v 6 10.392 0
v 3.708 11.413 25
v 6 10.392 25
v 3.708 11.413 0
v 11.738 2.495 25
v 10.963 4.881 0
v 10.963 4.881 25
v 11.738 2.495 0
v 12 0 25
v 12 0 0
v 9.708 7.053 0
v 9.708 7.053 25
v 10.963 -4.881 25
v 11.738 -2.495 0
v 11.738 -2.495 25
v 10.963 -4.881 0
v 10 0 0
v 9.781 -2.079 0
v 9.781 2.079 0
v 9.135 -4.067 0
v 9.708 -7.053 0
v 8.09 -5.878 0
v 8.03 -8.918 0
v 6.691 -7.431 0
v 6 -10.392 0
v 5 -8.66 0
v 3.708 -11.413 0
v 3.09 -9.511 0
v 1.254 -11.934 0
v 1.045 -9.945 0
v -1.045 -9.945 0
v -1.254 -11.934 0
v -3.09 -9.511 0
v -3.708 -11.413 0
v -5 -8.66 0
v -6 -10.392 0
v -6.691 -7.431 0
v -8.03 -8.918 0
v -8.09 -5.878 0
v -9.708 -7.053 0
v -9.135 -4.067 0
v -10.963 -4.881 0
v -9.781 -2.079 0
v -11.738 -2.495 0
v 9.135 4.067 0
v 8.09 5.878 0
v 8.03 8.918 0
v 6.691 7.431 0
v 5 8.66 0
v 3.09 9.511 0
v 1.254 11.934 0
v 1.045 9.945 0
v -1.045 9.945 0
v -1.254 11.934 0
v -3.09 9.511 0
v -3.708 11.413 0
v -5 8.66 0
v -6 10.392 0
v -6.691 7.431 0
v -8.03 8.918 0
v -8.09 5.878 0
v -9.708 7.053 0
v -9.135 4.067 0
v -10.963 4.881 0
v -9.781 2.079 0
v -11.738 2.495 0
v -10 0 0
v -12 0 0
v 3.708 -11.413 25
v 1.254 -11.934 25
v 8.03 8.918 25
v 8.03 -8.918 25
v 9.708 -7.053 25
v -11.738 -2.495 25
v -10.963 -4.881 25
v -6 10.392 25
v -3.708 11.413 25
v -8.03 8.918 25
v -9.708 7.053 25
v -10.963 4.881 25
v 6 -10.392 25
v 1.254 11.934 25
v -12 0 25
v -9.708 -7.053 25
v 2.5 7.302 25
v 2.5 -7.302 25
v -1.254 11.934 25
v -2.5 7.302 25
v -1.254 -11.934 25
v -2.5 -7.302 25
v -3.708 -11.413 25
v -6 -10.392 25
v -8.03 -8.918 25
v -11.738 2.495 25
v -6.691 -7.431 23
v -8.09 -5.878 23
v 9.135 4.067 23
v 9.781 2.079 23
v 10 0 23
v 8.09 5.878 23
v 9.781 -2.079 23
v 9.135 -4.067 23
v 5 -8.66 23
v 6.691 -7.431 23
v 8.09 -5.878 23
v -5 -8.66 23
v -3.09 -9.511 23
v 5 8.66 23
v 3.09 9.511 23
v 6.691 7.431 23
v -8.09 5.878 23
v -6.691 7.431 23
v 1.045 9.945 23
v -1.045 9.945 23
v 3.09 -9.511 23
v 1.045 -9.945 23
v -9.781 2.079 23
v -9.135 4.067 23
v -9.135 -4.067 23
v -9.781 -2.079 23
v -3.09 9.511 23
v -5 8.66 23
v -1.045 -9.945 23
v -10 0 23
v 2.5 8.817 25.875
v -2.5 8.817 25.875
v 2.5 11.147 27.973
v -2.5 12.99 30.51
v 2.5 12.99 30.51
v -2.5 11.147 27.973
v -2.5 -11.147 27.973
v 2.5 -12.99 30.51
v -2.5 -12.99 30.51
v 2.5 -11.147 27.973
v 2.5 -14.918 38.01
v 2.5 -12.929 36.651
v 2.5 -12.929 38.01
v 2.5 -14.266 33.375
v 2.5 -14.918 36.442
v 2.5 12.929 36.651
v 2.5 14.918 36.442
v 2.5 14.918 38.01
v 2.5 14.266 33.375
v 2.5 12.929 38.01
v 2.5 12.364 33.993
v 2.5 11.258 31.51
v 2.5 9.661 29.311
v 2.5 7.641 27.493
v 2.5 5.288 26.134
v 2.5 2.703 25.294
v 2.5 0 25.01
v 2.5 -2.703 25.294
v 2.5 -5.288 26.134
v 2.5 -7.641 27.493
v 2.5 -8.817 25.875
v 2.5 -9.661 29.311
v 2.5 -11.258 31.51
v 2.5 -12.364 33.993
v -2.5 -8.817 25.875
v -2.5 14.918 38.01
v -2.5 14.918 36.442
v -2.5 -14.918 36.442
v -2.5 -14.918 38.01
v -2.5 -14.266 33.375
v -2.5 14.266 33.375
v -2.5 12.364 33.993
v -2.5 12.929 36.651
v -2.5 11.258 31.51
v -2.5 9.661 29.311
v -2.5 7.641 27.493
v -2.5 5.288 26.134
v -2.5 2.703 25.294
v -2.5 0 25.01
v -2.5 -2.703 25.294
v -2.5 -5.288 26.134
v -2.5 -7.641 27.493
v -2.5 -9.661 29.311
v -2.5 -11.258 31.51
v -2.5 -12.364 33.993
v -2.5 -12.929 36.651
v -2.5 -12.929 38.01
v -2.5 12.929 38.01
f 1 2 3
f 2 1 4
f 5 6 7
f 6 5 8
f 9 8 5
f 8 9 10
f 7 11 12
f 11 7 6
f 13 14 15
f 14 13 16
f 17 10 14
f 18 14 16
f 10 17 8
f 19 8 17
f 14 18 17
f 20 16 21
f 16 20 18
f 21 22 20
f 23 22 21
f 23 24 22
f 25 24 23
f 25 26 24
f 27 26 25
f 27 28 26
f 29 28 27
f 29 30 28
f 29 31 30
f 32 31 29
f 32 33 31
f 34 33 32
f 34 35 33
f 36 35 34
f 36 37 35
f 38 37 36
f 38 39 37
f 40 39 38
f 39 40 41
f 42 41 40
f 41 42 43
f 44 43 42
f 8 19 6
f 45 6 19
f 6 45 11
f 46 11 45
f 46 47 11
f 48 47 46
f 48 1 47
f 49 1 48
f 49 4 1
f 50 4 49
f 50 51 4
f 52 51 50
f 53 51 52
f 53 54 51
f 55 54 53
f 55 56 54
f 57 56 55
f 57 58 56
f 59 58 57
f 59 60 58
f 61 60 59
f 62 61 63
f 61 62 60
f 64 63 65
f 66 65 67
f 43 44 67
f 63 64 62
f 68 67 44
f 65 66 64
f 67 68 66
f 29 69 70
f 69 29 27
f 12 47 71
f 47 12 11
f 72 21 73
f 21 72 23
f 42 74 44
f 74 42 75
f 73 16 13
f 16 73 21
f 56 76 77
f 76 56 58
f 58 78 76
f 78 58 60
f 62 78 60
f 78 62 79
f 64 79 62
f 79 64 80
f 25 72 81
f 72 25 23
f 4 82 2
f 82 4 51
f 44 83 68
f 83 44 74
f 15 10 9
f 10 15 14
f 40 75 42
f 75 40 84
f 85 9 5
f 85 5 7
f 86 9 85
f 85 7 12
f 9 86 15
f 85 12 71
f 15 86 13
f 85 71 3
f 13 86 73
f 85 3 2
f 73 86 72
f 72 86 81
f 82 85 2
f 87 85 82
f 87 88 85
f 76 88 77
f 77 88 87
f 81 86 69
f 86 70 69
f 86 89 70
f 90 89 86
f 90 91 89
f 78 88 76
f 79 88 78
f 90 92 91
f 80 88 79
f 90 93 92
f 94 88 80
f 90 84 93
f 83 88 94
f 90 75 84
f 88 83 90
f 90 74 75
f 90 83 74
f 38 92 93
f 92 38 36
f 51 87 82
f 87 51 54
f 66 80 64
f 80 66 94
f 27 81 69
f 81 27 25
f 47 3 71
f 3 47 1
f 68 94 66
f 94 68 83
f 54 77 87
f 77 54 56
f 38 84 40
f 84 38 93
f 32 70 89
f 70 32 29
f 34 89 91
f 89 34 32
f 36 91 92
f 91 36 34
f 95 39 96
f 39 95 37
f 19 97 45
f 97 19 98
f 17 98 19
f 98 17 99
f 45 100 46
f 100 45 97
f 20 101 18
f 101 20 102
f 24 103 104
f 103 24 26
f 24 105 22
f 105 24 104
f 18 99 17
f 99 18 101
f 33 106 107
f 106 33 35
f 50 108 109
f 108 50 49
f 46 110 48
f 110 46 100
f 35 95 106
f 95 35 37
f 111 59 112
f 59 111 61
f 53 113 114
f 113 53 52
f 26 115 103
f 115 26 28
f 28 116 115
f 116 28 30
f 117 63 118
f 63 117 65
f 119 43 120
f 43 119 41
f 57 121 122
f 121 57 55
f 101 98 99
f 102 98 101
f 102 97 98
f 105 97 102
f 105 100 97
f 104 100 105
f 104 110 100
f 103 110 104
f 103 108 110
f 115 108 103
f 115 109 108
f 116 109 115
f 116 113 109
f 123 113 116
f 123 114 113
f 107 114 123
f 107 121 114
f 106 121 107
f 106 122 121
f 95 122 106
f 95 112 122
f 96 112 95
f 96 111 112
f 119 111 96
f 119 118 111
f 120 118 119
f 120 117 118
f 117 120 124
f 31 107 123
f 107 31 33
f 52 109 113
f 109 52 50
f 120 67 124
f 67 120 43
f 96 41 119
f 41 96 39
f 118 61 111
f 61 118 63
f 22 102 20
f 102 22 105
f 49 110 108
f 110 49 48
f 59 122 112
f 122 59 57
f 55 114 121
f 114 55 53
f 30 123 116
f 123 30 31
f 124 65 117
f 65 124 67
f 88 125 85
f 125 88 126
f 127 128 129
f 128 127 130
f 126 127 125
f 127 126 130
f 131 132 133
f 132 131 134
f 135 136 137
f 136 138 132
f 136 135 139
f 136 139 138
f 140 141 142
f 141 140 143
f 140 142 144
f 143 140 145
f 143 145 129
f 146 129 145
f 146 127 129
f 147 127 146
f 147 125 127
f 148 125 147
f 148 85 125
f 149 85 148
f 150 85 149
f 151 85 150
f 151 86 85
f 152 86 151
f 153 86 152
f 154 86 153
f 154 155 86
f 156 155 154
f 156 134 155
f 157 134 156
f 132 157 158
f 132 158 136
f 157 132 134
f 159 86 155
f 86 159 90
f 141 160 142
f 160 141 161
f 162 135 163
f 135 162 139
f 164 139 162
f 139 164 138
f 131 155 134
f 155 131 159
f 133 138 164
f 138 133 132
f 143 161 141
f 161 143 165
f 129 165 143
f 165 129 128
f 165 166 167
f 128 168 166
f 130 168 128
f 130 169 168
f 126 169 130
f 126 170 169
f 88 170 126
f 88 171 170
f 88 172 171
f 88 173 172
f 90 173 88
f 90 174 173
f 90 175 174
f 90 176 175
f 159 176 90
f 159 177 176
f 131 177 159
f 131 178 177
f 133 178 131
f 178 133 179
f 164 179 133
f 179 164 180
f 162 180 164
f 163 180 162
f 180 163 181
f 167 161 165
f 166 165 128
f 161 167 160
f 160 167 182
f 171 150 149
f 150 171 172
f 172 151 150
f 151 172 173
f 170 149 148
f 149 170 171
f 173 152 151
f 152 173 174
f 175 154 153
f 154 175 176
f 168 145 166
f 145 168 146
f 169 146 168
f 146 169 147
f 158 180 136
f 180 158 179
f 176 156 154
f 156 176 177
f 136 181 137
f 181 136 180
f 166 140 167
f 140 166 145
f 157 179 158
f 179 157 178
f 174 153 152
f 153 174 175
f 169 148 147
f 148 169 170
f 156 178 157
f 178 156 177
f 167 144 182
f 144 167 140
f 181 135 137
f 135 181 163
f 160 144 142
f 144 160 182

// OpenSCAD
// Crown Radius
cr = 12; // [4:100]
// Crown Height
ch = 25; // [10:50]
// Saddle Radius
sr = 15; // [8:30]
// Saddle Width
sw = 5; // [2:15]
// Thickness
th = 2; // [2:6] 

difference() {
    cylinder(ch, r=cr);
    cylinder(ch-th, r=cr-th);
}

translate([-(sw/2),0,ch+sr-th + 0.01]) {
    rotate(a=[0,90,0]) {
        difference() {
            cylinder(sw, r=sr);
            translate([0,0,-1])
            cylinder(sw+2, r=sr-th);
            translate([-(sr),0,0])
            cube(sr*2, center=true); 
        }
    }
}
